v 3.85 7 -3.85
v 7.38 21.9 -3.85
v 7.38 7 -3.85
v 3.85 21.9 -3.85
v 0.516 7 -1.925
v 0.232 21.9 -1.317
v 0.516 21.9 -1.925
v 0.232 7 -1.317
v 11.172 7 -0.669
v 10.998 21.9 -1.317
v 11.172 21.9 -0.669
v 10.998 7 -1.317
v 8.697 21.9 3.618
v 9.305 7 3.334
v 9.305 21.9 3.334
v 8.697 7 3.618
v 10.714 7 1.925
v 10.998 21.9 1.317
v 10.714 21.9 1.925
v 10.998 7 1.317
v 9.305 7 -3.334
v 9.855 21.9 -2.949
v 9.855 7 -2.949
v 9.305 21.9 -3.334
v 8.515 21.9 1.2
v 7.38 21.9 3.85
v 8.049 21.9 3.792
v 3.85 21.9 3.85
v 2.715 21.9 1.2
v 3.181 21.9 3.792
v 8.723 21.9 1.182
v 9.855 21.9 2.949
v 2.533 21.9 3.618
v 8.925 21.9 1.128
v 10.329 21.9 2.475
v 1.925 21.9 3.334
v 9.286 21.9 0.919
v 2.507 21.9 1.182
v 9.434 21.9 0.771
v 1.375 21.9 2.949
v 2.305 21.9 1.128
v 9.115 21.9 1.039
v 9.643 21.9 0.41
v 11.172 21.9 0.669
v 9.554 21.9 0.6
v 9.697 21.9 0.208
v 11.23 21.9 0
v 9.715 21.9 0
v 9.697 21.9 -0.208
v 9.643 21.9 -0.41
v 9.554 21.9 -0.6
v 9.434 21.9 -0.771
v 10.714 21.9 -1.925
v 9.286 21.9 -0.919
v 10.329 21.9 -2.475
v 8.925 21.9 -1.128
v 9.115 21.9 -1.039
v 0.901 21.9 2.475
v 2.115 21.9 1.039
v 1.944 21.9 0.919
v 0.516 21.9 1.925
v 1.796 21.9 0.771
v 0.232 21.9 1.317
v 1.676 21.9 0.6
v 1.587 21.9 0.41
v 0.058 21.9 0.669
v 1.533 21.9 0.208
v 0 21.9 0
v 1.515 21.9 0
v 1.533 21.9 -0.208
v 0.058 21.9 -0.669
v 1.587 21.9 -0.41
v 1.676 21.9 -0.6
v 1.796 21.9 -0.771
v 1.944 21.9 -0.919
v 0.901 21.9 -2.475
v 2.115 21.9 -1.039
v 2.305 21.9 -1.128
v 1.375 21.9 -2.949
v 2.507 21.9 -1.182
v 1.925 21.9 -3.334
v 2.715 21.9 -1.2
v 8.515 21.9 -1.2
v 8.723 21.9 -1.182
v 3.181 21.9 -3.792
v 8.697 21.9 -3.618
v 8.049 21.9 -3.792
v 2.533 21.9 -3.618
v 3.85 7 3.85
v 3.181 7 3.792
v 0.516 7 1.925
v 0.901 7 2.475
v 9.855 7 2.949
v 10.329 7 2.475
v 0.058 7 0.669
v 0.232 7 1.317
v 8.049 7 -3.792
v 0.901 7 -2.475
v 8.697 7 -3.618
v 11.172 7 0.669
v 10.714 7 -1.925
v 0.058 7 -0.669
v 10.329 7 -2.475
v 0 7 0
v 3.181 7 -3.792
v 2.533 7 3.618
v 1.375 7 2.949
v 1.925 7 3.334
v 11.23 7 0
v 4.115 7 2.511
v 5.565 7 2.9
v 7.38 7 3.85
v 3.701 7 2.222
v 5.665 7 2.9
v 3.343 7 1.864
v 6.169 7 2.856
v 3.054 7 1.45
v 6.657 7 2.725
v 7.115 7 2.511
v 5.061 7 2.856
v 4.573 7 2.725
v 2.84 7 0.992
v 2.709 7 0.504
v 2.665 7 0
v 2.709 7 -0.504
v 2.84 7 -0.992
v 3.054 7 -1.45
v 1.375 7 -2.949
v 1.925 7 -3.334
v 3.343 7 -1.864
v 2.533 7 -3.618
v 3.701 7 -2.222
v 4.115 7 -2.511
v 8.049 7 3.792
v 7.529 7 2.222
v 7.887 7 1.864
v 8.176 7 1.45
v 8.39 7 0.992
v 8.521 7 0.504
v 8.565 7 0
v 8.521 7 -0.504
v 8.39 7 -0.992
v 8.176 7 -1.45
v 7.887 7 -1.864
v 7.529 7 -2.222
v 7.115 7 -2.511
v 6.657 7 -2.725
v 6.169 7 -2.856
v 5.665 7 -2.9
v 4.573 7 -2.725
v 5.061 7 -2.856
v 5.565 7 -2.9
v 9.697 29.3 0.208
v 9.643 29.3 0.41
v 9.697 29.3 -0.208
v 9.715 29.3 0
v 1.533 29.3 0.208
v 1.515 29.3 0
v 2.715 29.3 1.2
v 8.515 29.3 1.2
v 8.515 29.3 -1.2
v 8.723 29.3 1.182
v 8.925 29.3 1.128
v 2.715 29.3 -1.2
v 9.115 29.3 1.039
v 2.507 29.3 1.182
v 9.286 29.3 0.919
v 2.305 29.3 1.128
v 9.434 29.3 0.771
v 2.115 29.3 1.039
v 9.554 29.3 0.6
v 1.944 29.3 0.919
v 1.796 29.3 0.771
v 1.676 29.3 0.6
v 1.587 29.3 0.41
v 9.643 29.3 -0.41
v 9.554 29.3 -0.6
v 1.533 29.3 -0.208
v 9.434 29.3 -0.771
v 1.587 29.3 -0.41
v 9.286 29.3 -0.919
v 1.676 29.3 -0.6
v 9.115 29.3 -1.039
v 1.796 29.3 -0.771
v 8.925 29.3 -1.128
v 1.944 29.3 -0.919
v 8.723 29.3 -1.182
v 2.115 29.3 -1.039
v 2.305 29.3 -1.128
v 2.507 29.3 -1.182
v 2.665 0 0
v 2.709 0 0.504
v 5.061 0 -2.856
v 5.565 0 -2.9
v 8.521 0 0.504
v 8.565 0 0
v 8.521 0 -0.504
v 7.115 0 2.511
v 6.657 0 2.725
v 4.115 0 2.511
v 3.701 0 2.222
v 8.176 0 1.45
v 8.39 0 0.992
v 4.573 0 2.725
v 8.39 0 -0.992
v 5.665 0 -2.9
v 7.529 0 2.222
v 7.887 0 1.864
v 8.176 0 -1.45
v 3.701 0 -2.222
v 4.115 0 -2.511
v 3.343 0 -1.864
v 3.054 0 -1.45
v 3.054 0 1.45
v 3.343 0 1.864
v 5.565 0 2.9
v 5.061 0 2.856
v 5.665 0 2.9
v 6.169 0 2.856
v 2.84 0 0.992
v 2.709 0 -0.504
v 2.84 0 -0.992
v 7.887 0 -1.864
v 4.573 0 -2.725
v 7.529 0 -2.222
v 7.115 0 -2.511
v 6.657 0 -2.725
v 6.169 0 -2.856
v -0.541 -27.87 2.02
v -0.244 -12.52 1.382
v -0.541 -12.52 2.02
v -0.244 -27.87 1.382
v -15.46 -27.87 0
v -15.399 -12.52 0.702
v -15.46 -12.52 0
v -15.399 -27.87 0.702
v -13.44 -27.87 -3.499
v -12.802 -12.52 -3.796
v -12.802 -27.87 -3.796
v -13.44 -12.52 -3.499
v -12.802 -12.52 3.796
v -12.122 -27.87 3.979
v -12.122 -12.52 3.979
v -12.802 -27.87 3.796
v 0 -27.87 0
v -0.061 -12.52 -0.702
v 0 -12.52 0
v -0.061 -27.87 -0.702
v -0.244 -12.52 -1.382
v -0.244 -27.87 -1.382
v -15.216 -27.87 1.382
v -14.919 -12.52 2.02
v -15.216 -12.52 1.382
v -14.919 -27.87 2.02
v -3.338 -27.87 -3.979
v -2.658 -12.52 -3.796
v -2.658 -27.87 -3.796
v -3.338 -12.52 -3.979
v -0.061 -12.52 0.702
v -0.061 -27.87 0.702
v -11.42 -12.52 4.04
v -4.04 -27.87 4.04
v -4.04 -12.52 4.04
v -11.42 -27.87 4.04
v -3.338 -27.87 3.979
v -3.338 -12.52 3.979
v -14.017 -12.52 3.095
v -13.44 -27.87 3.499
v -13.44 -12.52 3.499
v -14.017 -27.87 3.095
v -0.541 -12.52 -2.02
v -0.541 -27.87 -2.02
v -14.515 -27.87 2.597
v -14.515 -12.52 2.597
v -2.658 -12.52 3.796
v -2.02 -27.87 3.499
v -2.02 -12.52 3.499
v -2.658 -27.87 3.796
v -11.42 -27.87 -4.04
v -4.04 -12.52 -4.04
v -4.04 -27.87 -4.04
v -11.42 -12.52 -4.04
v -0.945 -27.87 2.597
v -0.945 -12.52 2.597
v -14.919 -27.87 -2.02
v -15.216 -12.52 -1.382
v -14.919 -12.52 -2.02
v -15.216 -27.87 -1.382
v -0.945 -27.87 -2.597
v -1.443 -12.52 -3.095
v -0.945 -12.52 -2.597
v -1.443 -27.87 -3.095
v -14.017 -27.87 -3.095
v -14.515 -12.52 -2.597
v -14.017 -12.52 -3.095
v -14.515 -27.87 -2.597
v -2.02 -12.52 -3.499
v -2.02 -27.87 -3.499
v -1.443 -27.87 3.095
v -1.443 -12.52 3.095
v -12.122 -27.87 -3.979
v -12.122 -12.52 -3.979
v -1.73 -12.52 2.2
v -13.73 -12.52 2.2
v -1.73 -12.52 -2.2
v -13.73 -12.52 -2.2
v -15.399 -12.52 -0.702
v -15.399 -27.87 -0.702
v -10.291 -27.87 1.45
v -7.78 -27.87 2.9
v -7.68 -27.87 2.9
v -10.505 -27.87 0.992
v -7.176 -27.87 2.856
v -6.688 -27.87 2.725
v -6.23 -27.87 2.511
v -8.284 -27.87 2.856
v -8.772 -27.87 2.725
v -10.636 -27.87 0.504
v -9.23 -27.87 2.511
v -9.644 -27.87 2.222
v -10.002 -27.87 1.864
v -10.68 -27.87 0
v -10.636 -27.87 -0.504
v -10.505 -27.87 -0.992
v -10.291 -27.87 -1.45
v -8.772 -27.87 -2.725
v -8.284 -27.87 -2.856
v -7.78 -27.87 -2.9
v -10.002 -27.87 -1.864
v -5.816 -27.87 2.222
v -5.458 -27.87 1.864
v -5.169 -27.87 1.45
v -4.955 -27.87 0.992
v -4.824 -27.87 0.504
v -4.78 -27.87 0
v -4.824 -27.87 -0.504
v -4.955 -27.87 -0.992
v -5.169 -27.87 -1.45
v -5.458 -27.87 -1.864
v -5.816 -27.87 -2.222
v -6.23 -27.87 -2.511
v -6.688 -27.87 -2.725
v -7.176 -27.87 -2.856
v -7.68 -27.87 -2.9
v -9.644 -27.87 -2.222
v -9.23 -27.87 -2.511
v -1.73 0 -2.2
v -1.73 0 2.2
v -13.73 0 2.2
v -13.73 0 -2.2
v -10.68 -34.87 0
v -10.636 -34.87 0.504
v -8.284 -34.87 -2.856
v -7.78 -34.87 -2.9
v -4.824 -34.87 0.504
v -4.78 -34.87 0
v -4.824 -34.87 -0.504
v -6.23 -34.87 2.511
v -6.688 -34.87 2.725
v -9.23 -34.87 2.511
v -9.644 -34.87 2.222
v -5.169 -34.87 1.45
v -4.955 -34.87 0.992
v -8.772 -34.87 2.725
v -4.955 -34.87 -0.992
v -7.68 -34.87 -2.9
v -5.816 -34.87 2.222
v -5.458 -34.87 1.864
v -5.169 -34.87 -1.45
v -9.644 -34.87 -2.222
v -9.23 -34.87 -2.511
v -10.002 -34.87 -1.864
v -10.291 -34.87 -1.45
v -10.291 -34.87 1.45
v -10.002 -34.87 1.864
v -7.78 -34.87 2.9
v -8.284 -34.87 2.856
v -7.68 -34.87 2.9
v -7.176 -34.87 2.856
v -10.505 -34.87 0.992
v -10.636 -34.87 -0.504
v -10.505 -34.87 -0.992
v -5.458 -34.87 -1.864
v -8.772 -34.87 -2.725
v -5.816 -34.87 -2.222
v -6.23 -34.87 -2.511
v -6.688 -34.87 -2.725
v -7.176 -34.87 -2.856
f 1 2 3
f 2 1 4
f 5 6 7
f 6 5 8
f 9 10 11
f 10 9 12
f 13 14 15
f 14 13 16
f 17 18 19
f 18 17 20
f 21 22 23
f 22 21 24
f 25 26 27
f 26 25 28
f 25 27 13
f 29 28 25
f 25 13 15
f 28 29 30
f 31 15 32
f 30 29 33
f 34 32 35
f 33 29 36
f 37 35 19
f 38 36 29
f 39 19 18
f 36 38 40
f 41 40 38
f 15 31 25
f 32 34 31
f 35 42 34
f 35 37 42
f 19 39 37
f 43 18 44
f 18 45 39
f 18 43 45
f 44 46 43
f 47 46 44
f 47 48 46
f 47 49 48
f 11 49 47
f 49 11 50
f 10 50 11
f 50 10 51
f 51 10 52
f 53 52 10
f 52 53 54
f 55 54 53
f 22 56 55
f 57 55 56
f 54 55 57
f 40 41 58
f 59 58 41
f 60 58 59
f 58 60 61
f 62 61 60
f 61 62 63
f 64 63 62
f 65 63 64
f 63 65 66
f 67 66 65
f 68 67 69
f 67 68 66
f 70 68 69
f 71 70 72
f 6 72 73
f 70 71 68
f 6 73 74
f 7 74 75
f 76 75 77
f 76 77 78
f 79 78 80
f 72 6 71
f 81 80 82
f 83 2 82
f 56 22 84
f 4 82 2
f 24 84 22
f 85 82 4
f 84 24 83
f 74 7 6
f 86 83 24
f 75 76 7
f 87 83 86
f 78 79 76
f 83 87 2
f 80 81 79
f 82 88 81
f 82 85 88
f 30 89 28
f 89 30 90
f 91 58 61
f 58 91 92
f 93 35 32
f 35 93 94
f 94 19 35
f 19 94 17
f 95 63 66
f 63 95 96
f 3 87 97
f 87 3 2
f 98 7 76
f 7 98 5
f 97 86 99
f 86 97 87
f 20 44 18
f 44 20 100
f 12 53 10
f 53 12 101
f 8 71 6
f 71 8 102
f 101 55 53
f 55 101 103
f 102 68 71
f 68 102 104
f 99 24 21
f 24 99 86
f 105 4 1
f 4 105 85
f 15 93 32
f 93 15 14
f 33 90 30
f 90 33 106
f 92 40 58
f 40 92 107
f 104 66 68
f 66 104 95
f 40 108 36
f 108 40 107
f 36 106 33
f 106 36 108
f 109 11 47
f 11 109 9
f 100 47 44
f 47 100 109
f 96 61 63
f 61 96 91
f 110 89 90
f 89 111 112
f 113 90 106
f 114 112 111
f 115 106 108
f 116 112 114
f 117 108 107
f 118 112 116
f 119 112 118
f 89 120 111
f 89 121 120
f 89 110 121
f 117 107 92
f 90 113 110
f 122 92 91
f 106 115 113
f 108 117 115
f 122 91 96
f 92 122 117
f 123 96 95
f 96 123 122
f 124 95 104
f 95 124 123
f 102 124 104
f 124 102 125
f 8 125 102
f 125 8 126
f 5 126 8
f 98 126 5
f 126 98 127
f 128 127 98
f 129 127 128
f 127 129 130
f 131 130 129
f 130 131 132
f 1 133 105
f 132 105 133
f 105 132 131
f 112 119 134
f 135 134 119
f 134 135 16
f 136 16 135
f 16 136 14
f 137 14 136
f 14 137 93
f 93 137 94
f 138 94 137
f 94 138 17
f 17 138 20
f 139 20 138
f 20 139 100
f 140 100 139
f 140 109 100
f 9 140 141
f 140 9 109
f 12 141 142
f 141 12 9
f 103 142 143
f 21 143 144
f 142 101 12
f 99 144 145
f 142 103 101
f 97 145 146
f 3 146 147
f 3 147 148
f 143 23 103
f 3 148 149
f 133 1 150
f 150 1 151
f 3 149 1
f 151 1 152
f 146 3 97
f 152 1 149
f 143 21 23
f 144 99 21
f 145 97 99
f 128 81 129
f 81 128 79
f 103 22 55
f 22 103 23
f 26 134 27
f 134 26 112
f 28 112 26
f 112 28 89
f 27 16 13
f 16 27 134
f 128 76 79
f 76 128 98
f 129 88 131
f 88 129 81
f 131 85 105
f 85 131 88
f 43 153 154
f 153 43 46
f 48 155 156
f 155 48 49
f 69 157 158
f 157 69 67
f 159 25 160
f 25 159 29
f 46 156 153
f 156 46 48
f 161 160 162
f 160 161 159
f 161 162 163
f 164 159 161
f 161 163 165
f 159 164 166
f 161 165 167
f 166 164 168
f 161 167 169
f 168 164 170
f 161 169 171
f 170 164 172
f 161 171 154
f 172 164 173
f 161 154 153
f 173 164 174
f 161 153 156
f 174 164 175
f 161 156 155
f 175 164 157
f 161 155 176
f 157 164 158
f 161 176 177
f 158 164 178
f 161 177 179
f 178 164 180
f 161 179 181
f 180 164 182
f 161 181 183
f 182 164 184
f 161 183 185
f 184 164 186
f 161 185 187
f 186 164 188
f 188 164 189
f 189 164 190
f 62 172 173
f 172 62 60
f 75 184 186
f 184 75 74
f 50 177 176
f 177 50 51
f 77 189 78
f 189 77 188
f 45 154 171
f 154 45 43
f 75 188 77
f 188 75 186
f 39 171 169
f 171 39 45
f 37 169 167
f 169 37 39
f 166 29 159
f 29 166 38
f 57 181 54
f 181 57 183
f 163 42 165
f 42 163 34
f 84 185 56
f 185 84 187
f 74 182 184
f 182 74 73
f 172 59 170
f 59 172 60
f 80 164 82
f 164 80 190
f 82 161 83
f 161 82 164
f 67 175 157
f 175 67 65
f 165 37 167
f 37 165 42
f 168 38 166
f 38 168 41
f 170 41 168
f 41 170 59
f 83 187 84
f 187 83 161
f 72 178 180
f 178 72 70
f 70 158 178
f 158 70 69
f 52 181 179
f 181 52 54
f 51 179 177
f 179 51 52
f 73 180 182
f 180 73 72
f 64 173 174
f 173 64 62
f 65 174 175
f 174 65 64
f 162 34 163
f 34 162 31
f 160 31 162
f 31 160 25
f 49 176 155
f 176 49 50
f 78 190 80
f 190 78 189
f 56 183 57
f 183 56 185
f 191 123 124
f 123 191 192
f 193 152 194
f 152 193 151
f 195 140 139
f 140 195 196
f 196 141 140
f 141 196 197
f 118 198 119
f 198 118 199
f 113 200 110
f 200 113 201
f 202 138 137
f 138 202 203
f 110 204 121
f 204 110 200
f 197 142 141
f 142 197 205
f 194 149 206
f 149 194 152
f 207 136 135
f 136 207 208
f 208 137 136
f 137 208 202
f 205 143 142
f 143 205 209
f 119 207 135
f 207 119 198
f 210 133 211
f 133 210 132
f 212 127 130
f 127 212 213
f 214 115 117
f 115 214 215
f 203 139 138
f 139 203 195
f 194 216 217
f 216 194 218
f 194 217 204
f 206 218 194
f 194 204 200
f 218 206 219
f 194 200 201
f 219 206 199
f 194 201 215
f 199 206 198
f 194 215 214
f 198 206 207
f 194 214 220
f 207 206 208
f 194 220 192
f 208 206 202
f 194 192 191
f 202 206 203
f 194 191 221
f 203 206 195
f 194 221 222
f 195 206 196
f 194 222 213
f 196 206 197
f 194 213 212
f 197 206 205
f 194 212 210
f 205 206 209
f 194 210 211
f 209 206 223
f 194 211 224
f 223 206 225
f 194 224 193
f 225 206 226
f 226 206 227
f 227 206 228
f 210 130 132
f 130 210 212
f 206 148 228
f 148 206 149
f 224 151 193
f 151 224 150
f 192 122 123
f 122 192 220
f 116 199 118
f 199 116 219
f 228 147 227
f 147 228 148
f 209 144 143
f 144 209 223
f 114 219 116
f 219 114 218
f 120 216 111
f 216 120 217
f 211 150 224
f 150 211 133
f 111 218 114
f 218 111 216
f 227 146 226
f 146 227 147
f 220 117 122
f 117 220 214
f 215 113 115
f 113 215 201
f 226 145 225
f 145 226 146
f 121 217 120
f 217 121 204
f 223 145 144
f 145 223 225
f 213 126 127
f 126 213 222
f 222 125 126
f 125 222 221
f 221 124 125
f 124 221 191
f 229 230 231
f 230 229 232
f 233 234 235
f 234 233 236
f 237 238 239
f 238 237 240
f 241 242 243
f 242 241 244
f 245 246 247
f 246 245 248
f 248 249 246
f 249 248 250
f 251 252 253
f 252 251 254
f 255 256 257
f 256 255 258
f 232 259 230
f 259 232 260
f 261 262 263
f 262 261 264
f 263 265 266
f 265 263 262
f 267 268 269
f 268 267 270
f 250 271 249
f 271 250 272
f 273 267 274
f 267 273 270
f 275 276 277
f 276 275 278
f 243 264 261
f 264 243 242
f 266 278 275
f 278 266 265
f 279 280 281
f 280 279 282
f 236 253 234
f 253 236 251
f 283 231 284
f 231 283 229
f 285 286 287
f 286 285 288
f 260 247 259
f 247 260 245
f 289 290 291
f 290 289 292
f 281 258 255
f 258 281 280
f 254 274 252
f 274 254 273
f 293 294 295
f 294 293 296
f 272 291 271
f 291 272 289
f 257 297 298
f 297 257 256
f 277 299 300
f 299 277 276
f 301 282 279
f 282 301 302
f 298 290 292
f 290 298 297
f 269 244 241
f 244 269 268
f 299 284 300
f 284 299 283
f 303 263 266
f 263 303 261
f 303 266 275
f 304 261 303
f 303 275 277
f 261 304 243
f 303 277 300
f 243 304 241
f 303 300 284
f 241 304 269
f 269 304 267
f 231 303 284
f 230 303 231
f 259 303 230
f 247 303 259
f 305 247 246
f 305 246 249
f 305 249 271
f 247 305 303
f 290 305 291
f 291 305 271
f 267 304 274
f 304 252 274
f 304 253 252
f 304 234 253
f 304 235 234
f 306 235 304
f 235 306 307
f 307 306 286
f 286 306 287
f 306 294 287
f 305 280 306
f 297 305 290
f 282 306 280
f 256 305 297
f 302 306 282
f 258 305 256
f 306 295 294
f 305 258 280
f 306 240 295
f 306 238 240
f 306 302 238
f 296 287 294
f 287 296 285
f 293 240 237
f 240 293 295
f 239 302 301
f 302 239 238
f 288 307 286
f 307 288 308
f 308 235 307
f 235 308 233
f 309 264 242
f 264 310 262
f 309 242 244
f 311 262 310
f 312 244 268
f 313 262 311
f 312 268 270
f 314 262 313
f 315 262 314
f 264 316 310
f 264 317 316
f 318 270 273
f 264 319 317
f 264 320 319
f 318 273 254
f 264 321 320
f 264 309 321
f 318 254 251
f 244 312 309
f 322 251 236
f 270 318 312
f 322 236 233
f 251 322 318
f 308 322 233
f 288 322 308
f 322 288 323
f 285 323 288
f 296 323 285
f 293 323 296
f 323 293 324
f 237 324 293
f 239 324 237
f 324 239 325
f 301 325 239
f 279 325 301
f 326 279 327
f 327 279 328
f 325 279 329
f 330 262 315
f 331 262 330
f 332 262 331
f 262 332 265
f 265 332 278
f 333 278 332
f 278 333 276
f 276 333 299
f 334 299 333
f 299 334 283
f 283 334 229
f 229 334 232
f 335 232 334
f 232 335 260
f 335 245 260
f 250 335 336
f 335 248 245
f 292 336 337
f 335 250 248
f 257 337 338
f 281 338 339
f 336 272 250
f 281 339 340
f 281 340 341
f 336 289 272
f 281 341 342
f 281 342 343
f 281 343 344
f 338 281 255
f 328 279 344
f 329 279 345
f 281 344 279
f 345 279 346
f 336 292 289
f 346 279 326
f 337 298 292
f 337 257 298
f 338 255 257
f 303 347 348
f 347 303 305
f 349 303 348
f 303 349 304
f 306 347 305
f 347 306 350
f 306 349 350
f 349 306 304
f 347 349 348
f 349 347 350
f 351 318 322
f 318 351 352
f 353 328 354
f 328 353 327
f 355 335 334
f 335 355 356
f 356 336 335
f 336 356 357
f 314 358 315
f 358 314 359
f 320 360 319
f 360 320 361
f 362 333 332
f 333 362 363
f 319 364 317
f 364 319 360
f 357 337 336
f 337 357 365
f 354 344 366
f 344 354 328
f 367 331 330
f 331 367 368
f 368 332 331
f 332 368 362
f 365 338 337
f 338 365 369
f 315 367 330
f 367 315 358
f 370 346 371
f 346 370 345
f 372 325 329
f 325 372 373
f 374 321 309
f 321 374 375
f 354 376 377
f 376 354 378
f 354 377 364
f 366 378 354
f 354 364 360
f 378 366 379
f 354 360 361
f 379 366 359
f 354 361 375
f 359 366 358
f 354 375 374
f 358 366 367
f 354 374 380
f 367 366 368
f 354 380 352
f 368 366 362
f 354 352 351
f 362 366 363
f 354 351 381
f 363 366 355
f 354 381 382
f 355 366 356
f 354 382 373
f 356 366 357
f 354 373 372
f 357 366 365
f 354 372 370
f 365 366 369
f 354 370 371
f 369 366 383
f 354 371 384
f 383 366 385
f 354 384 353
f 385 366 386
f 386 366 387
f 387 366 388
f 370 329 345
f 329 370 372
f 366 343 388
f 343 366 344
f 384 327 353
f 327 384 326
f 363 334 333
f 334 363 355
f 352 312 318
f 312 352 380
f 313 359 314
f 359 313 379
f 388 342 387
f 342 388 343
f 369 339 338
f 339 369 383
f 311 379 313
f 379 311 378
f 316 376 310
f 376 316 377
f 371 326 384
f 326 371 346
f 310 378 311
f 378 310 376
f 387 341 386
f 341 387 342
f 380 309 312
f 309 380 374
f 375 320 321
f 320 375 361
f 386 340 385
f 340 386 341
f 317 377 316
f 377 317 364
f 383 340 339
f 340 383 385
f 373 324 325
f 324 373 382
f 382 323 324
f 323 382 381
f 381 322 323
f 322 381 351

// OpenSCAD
/**
  * Module: Generic USB plug module
  *
  * Author: Karim Aziiev <karim.aziiev@gmail.com>
  * License: GPL-3.0-or-later
  */

include <../../colors.scad>
include <../../parameters.scad>

use <../../lib/functions.scad>
use <../../lib/plist.scad>
use <../../lib/shapes3d.scad>
use <../../lib/transforms.scad>

function usb_plug_params(plist) =
  assert(plist_is(plist) && len(plist) > 0, "Supply a hardware specification")
  let (plug_shell=plist_get("plug_shell", plist, []),
       plug_shell_size=plist_get("size", plug_shell, [0, 0, 0]),
       plug_shell_color=plist_get("color", plug_shell, metallic_silver_3),
       plug_shell_round_axis=plist_get("round_axis", plug_shell, "y"),
       plug_shell_corner_r=plist_get("corner_r", plug_shell),
       plug_body=plist_get("plug_body", plist, []),
       plug_body_color=plist_get("color", plug_body, matte_black),
       plug_body_size=plist_get("size", plug_body),
       plug_body_round_axis=plist_get("round_axis", plug_body, "y"),
       plug_body_corner_r=plist_get("corner_r", plug_body, "50%"),
       strain_relief=plist_get("strain_relief", plist, []),
       strain_relief_d=plist_get("d", strain_relief, 0),
       strain_relief_l=plist_get("l", strain_relief),
       strain_relief_r_factor=plist_get("corner_r_factor", strain_relief, 0.5),
       strain_relief_size = plist_get("size",
                                      strain_relief,
                                      [strain_relief_d,
                                       strain_relief_l,
                                       strain_relief_d]),
       strain_l = with_default(with_default(strain_relief_l, strain_relief_size[1]),
                               0),
       strain_relief_color=plist_get("color", strain_relief, plug_body_color),
       plug_body_l=is_undef(plug_body_size) ? 0 : plug_body_size[1],
       body_with_strain_l = strain_l + plug_body_l,
       shell_l = plug_shell_size[1],
       max_thickness=max([for (v = [plug_body_size[2],
                                    plug_shell_size[2],
                                    with_default(strain_relief_d,
                                                 strain_relief_size[2])])
         if (!is_undef(v)) v]),
       max_w=max([for (v = [plug_body_size[0],
                            plug_shell_size[0],
                            with_default(strain_relief_d,
                                         strain_relief_size[0])])
         if (!is_undef(v)) v]),
       full_l=sum([for (v = [plug_body_l,
                             plug_shell_size[1],
                             strain_l])
         if (!is_undef(v)) v]))
  ["plug_shell", plug_shell,
   "plug_shell_size", plug_shell_size,
   "plug_shell_color", plug_shell_color,
   "plug_shell_round_axis", plug_shell_round_axis,
   "plug_shell_corner_r", plug_shell_corner_r,
   "plug_body", plug_body,
   "plug_body_color", plug_body_color,
   "plug_body_size", plug_body_size,
   "plug_body_round_axis", plug_body_round_axis,
   "plug_body_corner_r", plug_body_corner_r,
   "strain_relief", strain_relief,
   "strain_relief_d", strain_relief_d,
   "strain_relief_l", strain_relief_l,
   "strain_relief_r_factor", strain_relief_r_factor,
   "strain_relief_size", strain_relief_size,
   "strain_l", strain_l,
   "body_with_strain_l", body_with_strain_l,
   "shell_l", shell_l,
   "strain_relief_color", strain_relief_color,
   "plug_body_l", plug_body_l,
   "full_size", [max_w, full_l, max_thickness],
   "max_thickness", max_thickness,
   "max_w", max_w,
   "full_l", full_l];

function usb_oriented_size(plist,
                           orientation="wlh") =
  let (params = usb_plug_params(plist),
       full_size =  plist_get("full_size", params))
  orientation_size(orientation, full_size);

module generic_usb_plug(plist,
                        orientation="wlh",
                        anchor=[0, 0, 1],
                        rotate_z_180=false) {
  params = usb_plug_params(plist);

  plug_shell_size = plist_get("plug_shell_size", params);
  plug_shell_color = plist_get("plug_shell_color", params);
  plug_shell_round_axis = plist_get("plug_shell_round_axis", params);
  plug_shell_corner_r = plist_get("plug_shell_corner_r", params);

  plug_body_color = plist_get("plug_body_color", params);
  plug_body_size = plist_get("plug_body_size", params);
  plug_body_round_axis = plist_get("plug_body_round_axis", params);
  plug_body_corner_r = plist_get("plug_body_corner_r", params);

  strain_relief_d = plist_get("strain_relief_d", params);
  strain_relief_l = plist_get("strain_relief_l", params);
  strain_relief_r_factor = plist_get("strain_relief_r_factor", params);
  strain_relief_size = plist_get("strain_relief_size", params);
  strain_l = plist_get("strain_l", params);
  strain_relief_color = plist_get("strain_relief_color", params);
  plug_body_l = plist_get("plug_body_l", params);

  max_thickness = plist_get("max_thickness", params);
  max_w = plist_get("max_w", params);
  full_l = plist_get("full_l", params);

  _anchor=[0, 1, 0];

  with_orientation(anchor=anchor,
                   to=orientation,
                   rotate_z_180=rotate_z_180,
                   size=[max_w, full_l, max_thickness]) {
    translate([0, strain_l - full_l / 2, max_thickness / 2]) {
      union() {
        if (plug_body_size) {
          color(plug_body_color) {
            union() {
              cuboid(size=plug_body_size,
                     anchor=_anchor,
                     axis=plug_body_round_axis,
                     r=plug_body_corner_r);
            }
          }
        }

        if (plug_shell_size) {
          translate([0, plug_body_l, 0]) {
            color(plug_shell_color, alpha=1) {
              cuboid(size=plug_shell_size,
                     anchor=_anchor,
                     r=plug_shell_corner_r,
                     axis=plug_shell_round_axis);
            }
          }
        }
        if (strain_relief_d > 0 && strain_l > 0) {
          color(strain_relief_color) {
            cyl(h=strain_relief_l,
                d=strain_relief_d,
                anchor=[0, -1, 0],
                orientation="lhw");
          }
        } else if (strain_relief_size[0] > 0) {
          color(strain_relief_color) {
            let (size = [strain_relief_size[0],
                         strain_relief_size[2],
                         strain_relief_size[1]]) {
              with_orientation(from="wlh",
                               to="whl",
                               anchor=[0, -1, 0],
                               size=size) {
                cuboid(size=size,
                       anchor=[0, 0, 1],
                       r_factor=strain_relief_r_factor);
              }
            }
          }
        }
      }
    }
  }
}

generic_usb_plug(plist=usb_c_plist,
                 anchor=[1, 1, 0]);

generic_usb_plug(plist=usb_a_plist,
                 anchor=[-1, -1, 0]);
